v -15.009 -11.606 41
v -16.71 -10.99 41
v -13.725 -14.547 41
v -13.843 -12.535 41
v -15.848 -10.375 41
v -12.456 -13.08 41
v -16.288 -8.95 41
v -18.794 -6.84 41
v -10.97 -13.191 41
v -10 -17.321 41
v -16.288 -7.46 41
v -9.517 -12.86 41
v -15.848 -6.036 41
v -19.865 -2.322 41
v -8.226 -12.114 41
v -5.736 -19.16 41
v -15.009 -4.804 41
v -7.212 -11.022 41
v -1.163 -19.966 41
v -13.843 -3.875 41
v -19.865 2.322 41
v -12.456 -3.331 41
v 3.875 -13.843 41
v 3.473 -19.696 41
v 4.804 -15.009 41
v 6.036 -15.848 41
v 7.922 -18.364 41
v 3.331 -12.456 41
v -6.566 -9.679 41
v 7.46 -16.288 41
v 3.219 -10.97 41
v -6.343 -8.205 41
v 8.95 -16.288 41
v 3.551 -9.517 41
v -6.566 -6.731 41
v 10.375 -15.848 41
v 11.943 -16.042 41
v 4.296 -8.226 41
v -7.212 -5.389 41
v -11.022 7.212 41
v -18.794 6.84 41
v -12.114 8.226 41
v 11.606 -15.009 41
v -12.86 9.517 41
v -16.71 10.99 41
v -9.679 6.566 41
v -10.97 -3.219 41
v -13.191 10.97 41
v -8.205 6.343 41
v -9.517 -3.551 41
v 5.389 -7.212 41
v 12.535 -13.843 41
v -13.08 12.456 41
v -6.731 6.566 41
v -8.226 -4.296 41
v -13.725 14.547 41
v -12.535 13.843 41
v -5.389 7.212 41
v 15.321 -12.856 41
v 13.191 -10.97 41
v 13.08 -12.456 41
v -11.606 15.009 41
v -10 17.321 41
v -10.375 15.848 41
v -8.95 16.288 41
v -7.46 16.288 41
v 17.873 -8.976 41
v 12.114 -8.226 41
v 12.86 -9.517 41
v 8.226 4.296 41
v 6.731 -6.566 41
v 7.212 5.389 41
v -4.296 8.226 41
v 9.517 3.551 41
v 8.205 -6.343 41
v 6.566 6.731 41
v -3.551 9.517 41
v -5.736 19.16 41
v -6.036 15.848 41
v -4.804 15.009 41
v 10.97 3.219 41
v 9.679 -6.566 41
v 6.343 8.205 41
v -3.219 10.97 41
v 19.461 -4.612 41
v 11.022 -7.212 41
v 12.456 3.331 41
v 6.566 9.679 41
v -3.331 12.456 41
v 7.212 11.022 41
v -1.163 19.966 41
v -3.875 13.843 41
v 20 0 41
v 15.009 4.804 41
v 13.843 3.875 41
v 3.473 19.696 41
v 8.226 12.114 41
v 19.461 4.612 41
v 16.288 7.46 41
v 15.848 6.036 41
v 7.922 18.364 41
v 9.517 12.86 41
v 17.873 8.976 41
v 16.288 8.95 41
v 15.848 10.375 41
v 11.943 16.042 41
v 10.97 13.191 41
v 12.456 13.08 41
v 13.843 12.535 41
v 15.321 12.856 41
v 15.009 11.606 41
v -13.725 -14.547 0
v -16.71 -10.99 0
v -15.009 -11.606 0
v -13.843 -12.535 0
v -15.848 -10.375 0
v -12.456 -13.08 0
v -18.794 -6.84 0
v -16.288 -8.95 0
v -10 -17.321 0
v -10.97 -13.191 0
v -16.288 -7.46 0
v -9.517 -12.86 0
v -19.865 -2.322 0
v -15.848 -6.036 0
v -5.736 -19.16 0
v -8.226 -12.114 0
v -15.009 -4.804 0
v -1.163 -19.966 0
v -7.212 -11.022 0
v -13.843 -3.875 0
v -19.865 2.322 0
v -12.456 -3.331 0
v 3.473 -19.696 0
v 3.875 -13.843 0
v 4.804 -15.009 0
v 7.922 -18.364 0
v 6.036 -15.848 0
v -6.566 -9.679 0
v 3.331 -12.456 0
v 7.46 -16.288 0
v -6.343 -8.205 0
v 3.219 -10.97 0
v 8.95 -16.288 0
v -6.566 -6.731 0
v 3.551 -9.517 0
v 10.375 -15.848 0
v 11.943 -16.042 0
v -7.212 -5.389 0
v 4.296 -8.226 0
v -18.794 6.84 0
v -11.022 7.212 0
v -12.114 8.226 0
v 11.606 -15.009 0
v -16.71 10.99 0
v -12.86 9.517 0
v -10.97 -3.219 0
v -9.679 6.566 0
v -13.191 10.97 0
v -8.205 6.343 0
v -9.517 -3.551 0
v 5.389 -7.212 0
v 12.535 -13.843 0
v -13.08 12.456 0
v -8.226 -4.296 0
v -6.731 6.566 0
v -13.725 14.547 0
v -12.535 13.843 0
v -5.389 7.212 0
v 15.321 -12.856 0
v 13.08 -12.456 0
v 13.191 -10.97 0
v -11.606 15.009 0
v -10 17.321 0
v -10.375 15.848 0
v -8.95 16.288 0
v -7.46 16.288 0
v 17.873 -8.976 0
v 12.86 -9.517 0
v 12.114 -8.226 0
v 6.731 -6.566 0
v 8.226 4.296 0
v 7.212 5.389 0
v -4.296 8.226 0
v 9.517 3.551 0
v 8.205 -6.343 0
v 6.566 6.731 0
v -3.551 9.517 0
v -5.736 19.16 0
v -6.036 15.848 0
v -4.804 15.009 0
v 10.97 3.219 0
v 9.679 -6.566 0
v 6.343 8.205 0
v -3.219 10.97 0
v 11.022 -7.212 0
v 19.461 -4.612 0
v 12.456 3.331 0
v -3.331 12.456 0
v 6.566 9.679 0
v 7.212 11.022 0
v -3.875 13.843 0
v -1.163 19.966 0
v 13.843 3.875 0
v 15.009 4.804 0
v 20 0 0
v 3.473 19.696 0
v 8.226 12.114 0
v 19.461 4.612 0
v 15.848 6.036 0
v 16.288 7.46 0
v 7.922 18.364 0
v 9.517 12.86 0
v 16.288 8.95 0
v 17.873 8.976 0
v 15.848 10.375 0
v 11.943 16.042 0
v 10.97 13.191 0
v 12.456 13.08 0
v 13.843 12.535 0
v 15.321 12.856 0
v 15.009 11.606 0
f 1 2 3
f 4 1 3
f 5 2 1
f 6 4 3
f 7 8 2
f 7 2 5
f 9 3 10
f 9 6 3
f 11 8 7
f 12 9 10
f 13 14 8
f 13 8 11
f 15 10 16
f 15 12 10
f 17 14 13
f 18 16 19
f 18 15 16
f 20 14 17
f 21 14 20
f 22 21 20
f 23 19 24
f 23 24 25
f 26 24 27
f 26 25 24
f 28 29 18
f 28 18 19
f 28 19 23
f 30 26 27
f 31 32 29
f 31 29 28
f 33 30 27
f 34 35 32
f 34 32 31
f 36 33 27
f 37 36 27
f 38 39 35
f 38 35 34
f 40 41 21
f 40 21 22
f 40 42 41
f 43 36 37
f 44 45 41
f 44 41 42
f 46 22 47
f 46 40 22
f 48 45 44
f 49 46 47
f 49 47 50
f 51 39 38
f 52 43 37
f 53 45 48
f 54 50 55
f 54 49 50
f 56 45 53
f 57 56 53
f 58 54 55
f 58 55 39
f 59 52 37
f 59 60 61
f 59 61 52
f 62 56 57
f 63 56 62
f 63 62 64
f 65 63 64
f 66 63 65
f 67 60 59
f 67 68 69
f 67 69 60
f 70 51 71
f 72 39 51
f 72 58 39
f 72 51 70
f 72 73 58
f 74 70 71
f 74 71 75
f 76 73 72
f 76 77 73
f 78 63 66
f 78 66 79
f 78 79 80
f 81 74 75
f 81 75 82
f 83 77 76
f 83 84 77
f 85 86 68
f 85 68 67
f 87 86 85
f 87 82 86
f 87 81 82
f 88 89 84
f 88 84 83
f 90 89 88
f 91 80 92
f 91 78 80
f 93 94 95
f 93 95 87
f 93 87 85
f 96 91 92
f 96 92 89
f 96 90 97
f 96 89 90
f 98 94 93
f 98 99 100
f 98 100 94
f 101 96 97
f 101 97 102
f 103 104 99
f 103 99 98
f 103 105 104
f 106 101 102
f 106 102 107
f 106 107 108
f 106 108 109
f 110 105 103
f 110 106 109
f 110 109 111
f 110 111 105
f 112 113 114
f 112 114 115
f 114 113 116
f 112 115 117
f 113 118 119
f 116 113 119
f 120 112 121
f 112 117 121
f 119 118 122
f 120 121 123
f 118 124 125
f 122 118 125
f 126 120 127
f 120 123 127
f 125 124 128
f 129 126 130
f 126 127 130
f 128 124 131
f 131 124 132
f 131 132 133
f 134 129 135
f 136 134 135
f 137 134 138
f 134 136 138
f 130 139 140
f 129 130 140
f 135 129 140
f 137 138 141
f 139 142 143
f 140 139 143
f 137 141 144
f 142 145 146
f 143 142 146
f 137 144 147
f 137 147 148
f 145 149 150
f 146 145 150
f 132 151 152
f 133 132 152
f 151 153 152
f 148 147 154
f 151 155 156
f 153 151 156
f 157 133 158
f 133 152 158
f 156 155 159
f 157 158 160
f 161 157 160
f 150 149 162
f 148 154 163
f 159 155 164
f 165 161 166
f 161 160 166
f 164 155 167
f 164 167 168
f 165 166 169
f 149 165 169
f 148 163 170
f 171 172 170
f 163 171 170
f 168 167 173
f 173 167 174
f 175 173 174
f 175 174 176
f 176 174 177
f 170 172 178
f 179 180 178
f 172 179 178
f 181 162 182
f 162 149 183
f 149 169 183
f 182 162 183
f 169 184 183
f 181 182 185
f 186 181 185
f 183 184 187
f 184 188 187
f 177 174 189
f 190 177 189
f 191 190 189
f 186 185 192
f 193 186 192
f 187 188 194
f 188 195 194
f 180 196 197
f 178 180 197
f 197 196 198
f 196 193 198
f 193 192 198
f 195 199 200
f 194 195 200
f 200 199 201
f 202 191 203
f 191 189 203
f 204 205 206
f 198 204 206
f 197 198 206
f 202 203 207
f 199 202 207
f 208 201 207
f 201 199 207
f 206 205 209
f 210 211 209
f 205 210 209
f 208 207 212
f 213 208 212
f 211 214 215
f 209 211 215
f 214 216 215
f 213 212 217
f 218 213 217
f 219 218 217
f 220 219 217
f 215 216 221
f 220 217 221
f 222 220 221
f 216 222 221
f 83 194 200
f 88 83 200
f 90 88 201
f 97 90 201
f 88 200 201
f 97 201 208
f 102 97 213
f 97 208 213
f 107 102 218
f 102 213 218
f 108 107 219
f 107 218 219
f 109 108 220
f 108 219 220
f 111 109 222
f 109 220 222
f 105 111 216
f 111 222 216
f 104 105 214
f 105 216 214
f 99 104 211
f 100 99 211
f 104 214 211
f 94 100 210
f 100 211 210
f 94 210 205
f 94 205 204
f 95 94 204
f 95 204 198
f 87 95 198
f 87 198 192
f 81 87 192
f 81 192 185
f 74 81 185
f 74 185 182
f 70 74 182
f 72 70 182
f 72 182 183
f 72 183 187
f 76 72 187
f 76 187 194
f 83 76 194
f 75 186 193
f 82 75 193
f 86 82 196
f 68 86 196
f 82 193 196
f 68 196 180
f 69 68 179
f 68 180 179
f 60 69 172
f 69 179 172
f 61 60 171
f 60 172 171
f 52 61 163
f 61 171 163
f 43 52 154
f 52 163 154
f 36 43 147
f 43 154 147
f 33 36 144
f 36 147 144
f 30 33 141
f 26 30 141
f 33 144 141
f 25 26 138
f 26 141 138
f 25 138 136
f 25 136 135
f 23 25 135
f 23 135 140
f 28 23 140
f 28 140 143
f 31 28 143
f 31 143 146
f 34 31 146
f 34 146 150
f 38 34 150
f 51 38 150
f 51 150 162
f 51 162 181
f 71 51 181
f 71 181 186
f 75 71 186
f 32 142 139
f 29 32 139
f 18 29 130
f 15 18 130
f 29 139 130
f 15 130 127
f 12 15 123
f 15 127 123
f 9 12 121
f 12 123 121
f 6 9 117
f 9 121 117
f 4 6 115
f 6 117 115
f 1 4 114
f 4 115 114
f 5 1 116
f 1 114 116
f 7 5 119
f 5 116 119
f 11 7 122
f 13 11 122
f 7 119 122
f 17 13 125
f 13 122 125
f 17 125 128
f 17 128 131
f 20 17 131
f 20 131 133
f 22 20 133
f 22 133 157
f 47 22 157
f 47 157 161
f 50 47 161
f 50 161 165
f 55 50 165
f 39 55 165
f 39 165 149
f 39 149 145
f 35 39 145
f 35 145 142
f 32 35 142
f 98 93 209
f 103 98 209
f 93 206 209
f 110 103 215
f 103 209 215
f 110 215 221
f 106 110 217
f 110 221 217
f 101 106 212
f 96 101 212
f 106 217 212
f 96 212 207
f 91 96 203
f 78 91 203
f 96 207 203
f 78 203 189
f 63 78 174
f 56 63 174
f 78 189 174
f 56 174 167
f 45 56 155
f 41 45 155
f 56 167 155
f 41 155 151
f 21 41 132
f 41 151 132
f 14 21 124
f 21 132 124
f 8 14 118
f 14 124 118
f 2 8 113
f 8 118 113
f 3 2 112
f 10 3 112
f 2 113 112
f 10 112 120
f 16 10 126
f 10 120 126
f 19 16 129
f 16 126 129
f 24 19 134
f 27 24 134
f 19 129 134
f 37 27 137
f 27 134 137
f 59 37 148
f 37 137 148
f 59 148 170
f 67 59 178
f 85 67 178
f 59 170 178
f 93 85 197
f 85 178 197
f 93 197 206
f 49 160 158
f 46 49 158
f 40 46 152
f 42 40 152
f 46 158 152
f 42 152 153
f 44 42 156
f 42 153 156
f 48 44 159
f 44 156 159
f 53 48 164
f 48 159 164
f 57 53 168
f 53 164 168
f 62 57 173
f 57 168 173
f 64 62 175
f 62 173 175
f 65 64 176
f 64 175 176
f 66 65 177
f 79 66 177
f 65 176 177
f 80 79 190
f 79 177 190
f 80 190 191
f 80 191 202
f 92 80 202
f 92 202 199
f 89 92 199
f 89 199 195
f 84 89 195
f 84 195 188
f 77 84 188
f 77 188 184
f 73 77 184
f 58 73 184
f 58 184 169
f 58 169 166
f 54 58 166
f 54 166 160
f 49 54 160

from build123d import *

# Parameters (mm, degrees)
SKETCH2_R           = 20
BOSS_EXTRUDE1_DEPTH = 35
SKETCH5_R           = 20
BOSS_EXTRUDE4_DEPTH = 6
SKETCH6_R           = 5
CUT_EXTRUDE1_DEPTH  = 50.809637622
CIRPATTERN2_COUNT   = 4


with BuildPart() as part:
    # Sketch2 → Boss-Extrude1 (new body)
    with BuildSketch(Plane.XY):
        Circle(SKETCH2_R)
    extrude(amount=BOSS_EXTRUDE1_DEPTH)

    # Sketch5 → Boss-Extrude4 (add)
    with BuildSketch(Plane.XY.offset(35)):
        Circle(SKETCH5_R)
    extrude(amount=BOSS_EXTRUDE4_DEPTH)

    # Sketch6 → Cut-Extrude1 (cut, through all)
    with BuildSketch(Plane(origin=(0, 0, 0), x_dir=(-1, 0, 0), z_dir=(0, 0, -1))):
        with Locations((-11.343432643, 8.205274881)):
            Circle(SKETCH6_R)
    cut_extrude1 = extrude(amount=-CUT_EXTRUDE1_DEPTH, mode=Mode.SUBTRACT)

    # CirPattern2: Cut-Extrude1 ×4 about axis
    cirpattern2_axis = Axis((0, 0, 0), (0, 0, 1))
    for i in range(1, CIRPATTERN2_COUNT):
        add(cut_extrude1.rotate(cirpattern2_axis, i * 360 / CIRPATTERN2_COUNT), mode=Mode.SUBTRACT)


solid = part.part
